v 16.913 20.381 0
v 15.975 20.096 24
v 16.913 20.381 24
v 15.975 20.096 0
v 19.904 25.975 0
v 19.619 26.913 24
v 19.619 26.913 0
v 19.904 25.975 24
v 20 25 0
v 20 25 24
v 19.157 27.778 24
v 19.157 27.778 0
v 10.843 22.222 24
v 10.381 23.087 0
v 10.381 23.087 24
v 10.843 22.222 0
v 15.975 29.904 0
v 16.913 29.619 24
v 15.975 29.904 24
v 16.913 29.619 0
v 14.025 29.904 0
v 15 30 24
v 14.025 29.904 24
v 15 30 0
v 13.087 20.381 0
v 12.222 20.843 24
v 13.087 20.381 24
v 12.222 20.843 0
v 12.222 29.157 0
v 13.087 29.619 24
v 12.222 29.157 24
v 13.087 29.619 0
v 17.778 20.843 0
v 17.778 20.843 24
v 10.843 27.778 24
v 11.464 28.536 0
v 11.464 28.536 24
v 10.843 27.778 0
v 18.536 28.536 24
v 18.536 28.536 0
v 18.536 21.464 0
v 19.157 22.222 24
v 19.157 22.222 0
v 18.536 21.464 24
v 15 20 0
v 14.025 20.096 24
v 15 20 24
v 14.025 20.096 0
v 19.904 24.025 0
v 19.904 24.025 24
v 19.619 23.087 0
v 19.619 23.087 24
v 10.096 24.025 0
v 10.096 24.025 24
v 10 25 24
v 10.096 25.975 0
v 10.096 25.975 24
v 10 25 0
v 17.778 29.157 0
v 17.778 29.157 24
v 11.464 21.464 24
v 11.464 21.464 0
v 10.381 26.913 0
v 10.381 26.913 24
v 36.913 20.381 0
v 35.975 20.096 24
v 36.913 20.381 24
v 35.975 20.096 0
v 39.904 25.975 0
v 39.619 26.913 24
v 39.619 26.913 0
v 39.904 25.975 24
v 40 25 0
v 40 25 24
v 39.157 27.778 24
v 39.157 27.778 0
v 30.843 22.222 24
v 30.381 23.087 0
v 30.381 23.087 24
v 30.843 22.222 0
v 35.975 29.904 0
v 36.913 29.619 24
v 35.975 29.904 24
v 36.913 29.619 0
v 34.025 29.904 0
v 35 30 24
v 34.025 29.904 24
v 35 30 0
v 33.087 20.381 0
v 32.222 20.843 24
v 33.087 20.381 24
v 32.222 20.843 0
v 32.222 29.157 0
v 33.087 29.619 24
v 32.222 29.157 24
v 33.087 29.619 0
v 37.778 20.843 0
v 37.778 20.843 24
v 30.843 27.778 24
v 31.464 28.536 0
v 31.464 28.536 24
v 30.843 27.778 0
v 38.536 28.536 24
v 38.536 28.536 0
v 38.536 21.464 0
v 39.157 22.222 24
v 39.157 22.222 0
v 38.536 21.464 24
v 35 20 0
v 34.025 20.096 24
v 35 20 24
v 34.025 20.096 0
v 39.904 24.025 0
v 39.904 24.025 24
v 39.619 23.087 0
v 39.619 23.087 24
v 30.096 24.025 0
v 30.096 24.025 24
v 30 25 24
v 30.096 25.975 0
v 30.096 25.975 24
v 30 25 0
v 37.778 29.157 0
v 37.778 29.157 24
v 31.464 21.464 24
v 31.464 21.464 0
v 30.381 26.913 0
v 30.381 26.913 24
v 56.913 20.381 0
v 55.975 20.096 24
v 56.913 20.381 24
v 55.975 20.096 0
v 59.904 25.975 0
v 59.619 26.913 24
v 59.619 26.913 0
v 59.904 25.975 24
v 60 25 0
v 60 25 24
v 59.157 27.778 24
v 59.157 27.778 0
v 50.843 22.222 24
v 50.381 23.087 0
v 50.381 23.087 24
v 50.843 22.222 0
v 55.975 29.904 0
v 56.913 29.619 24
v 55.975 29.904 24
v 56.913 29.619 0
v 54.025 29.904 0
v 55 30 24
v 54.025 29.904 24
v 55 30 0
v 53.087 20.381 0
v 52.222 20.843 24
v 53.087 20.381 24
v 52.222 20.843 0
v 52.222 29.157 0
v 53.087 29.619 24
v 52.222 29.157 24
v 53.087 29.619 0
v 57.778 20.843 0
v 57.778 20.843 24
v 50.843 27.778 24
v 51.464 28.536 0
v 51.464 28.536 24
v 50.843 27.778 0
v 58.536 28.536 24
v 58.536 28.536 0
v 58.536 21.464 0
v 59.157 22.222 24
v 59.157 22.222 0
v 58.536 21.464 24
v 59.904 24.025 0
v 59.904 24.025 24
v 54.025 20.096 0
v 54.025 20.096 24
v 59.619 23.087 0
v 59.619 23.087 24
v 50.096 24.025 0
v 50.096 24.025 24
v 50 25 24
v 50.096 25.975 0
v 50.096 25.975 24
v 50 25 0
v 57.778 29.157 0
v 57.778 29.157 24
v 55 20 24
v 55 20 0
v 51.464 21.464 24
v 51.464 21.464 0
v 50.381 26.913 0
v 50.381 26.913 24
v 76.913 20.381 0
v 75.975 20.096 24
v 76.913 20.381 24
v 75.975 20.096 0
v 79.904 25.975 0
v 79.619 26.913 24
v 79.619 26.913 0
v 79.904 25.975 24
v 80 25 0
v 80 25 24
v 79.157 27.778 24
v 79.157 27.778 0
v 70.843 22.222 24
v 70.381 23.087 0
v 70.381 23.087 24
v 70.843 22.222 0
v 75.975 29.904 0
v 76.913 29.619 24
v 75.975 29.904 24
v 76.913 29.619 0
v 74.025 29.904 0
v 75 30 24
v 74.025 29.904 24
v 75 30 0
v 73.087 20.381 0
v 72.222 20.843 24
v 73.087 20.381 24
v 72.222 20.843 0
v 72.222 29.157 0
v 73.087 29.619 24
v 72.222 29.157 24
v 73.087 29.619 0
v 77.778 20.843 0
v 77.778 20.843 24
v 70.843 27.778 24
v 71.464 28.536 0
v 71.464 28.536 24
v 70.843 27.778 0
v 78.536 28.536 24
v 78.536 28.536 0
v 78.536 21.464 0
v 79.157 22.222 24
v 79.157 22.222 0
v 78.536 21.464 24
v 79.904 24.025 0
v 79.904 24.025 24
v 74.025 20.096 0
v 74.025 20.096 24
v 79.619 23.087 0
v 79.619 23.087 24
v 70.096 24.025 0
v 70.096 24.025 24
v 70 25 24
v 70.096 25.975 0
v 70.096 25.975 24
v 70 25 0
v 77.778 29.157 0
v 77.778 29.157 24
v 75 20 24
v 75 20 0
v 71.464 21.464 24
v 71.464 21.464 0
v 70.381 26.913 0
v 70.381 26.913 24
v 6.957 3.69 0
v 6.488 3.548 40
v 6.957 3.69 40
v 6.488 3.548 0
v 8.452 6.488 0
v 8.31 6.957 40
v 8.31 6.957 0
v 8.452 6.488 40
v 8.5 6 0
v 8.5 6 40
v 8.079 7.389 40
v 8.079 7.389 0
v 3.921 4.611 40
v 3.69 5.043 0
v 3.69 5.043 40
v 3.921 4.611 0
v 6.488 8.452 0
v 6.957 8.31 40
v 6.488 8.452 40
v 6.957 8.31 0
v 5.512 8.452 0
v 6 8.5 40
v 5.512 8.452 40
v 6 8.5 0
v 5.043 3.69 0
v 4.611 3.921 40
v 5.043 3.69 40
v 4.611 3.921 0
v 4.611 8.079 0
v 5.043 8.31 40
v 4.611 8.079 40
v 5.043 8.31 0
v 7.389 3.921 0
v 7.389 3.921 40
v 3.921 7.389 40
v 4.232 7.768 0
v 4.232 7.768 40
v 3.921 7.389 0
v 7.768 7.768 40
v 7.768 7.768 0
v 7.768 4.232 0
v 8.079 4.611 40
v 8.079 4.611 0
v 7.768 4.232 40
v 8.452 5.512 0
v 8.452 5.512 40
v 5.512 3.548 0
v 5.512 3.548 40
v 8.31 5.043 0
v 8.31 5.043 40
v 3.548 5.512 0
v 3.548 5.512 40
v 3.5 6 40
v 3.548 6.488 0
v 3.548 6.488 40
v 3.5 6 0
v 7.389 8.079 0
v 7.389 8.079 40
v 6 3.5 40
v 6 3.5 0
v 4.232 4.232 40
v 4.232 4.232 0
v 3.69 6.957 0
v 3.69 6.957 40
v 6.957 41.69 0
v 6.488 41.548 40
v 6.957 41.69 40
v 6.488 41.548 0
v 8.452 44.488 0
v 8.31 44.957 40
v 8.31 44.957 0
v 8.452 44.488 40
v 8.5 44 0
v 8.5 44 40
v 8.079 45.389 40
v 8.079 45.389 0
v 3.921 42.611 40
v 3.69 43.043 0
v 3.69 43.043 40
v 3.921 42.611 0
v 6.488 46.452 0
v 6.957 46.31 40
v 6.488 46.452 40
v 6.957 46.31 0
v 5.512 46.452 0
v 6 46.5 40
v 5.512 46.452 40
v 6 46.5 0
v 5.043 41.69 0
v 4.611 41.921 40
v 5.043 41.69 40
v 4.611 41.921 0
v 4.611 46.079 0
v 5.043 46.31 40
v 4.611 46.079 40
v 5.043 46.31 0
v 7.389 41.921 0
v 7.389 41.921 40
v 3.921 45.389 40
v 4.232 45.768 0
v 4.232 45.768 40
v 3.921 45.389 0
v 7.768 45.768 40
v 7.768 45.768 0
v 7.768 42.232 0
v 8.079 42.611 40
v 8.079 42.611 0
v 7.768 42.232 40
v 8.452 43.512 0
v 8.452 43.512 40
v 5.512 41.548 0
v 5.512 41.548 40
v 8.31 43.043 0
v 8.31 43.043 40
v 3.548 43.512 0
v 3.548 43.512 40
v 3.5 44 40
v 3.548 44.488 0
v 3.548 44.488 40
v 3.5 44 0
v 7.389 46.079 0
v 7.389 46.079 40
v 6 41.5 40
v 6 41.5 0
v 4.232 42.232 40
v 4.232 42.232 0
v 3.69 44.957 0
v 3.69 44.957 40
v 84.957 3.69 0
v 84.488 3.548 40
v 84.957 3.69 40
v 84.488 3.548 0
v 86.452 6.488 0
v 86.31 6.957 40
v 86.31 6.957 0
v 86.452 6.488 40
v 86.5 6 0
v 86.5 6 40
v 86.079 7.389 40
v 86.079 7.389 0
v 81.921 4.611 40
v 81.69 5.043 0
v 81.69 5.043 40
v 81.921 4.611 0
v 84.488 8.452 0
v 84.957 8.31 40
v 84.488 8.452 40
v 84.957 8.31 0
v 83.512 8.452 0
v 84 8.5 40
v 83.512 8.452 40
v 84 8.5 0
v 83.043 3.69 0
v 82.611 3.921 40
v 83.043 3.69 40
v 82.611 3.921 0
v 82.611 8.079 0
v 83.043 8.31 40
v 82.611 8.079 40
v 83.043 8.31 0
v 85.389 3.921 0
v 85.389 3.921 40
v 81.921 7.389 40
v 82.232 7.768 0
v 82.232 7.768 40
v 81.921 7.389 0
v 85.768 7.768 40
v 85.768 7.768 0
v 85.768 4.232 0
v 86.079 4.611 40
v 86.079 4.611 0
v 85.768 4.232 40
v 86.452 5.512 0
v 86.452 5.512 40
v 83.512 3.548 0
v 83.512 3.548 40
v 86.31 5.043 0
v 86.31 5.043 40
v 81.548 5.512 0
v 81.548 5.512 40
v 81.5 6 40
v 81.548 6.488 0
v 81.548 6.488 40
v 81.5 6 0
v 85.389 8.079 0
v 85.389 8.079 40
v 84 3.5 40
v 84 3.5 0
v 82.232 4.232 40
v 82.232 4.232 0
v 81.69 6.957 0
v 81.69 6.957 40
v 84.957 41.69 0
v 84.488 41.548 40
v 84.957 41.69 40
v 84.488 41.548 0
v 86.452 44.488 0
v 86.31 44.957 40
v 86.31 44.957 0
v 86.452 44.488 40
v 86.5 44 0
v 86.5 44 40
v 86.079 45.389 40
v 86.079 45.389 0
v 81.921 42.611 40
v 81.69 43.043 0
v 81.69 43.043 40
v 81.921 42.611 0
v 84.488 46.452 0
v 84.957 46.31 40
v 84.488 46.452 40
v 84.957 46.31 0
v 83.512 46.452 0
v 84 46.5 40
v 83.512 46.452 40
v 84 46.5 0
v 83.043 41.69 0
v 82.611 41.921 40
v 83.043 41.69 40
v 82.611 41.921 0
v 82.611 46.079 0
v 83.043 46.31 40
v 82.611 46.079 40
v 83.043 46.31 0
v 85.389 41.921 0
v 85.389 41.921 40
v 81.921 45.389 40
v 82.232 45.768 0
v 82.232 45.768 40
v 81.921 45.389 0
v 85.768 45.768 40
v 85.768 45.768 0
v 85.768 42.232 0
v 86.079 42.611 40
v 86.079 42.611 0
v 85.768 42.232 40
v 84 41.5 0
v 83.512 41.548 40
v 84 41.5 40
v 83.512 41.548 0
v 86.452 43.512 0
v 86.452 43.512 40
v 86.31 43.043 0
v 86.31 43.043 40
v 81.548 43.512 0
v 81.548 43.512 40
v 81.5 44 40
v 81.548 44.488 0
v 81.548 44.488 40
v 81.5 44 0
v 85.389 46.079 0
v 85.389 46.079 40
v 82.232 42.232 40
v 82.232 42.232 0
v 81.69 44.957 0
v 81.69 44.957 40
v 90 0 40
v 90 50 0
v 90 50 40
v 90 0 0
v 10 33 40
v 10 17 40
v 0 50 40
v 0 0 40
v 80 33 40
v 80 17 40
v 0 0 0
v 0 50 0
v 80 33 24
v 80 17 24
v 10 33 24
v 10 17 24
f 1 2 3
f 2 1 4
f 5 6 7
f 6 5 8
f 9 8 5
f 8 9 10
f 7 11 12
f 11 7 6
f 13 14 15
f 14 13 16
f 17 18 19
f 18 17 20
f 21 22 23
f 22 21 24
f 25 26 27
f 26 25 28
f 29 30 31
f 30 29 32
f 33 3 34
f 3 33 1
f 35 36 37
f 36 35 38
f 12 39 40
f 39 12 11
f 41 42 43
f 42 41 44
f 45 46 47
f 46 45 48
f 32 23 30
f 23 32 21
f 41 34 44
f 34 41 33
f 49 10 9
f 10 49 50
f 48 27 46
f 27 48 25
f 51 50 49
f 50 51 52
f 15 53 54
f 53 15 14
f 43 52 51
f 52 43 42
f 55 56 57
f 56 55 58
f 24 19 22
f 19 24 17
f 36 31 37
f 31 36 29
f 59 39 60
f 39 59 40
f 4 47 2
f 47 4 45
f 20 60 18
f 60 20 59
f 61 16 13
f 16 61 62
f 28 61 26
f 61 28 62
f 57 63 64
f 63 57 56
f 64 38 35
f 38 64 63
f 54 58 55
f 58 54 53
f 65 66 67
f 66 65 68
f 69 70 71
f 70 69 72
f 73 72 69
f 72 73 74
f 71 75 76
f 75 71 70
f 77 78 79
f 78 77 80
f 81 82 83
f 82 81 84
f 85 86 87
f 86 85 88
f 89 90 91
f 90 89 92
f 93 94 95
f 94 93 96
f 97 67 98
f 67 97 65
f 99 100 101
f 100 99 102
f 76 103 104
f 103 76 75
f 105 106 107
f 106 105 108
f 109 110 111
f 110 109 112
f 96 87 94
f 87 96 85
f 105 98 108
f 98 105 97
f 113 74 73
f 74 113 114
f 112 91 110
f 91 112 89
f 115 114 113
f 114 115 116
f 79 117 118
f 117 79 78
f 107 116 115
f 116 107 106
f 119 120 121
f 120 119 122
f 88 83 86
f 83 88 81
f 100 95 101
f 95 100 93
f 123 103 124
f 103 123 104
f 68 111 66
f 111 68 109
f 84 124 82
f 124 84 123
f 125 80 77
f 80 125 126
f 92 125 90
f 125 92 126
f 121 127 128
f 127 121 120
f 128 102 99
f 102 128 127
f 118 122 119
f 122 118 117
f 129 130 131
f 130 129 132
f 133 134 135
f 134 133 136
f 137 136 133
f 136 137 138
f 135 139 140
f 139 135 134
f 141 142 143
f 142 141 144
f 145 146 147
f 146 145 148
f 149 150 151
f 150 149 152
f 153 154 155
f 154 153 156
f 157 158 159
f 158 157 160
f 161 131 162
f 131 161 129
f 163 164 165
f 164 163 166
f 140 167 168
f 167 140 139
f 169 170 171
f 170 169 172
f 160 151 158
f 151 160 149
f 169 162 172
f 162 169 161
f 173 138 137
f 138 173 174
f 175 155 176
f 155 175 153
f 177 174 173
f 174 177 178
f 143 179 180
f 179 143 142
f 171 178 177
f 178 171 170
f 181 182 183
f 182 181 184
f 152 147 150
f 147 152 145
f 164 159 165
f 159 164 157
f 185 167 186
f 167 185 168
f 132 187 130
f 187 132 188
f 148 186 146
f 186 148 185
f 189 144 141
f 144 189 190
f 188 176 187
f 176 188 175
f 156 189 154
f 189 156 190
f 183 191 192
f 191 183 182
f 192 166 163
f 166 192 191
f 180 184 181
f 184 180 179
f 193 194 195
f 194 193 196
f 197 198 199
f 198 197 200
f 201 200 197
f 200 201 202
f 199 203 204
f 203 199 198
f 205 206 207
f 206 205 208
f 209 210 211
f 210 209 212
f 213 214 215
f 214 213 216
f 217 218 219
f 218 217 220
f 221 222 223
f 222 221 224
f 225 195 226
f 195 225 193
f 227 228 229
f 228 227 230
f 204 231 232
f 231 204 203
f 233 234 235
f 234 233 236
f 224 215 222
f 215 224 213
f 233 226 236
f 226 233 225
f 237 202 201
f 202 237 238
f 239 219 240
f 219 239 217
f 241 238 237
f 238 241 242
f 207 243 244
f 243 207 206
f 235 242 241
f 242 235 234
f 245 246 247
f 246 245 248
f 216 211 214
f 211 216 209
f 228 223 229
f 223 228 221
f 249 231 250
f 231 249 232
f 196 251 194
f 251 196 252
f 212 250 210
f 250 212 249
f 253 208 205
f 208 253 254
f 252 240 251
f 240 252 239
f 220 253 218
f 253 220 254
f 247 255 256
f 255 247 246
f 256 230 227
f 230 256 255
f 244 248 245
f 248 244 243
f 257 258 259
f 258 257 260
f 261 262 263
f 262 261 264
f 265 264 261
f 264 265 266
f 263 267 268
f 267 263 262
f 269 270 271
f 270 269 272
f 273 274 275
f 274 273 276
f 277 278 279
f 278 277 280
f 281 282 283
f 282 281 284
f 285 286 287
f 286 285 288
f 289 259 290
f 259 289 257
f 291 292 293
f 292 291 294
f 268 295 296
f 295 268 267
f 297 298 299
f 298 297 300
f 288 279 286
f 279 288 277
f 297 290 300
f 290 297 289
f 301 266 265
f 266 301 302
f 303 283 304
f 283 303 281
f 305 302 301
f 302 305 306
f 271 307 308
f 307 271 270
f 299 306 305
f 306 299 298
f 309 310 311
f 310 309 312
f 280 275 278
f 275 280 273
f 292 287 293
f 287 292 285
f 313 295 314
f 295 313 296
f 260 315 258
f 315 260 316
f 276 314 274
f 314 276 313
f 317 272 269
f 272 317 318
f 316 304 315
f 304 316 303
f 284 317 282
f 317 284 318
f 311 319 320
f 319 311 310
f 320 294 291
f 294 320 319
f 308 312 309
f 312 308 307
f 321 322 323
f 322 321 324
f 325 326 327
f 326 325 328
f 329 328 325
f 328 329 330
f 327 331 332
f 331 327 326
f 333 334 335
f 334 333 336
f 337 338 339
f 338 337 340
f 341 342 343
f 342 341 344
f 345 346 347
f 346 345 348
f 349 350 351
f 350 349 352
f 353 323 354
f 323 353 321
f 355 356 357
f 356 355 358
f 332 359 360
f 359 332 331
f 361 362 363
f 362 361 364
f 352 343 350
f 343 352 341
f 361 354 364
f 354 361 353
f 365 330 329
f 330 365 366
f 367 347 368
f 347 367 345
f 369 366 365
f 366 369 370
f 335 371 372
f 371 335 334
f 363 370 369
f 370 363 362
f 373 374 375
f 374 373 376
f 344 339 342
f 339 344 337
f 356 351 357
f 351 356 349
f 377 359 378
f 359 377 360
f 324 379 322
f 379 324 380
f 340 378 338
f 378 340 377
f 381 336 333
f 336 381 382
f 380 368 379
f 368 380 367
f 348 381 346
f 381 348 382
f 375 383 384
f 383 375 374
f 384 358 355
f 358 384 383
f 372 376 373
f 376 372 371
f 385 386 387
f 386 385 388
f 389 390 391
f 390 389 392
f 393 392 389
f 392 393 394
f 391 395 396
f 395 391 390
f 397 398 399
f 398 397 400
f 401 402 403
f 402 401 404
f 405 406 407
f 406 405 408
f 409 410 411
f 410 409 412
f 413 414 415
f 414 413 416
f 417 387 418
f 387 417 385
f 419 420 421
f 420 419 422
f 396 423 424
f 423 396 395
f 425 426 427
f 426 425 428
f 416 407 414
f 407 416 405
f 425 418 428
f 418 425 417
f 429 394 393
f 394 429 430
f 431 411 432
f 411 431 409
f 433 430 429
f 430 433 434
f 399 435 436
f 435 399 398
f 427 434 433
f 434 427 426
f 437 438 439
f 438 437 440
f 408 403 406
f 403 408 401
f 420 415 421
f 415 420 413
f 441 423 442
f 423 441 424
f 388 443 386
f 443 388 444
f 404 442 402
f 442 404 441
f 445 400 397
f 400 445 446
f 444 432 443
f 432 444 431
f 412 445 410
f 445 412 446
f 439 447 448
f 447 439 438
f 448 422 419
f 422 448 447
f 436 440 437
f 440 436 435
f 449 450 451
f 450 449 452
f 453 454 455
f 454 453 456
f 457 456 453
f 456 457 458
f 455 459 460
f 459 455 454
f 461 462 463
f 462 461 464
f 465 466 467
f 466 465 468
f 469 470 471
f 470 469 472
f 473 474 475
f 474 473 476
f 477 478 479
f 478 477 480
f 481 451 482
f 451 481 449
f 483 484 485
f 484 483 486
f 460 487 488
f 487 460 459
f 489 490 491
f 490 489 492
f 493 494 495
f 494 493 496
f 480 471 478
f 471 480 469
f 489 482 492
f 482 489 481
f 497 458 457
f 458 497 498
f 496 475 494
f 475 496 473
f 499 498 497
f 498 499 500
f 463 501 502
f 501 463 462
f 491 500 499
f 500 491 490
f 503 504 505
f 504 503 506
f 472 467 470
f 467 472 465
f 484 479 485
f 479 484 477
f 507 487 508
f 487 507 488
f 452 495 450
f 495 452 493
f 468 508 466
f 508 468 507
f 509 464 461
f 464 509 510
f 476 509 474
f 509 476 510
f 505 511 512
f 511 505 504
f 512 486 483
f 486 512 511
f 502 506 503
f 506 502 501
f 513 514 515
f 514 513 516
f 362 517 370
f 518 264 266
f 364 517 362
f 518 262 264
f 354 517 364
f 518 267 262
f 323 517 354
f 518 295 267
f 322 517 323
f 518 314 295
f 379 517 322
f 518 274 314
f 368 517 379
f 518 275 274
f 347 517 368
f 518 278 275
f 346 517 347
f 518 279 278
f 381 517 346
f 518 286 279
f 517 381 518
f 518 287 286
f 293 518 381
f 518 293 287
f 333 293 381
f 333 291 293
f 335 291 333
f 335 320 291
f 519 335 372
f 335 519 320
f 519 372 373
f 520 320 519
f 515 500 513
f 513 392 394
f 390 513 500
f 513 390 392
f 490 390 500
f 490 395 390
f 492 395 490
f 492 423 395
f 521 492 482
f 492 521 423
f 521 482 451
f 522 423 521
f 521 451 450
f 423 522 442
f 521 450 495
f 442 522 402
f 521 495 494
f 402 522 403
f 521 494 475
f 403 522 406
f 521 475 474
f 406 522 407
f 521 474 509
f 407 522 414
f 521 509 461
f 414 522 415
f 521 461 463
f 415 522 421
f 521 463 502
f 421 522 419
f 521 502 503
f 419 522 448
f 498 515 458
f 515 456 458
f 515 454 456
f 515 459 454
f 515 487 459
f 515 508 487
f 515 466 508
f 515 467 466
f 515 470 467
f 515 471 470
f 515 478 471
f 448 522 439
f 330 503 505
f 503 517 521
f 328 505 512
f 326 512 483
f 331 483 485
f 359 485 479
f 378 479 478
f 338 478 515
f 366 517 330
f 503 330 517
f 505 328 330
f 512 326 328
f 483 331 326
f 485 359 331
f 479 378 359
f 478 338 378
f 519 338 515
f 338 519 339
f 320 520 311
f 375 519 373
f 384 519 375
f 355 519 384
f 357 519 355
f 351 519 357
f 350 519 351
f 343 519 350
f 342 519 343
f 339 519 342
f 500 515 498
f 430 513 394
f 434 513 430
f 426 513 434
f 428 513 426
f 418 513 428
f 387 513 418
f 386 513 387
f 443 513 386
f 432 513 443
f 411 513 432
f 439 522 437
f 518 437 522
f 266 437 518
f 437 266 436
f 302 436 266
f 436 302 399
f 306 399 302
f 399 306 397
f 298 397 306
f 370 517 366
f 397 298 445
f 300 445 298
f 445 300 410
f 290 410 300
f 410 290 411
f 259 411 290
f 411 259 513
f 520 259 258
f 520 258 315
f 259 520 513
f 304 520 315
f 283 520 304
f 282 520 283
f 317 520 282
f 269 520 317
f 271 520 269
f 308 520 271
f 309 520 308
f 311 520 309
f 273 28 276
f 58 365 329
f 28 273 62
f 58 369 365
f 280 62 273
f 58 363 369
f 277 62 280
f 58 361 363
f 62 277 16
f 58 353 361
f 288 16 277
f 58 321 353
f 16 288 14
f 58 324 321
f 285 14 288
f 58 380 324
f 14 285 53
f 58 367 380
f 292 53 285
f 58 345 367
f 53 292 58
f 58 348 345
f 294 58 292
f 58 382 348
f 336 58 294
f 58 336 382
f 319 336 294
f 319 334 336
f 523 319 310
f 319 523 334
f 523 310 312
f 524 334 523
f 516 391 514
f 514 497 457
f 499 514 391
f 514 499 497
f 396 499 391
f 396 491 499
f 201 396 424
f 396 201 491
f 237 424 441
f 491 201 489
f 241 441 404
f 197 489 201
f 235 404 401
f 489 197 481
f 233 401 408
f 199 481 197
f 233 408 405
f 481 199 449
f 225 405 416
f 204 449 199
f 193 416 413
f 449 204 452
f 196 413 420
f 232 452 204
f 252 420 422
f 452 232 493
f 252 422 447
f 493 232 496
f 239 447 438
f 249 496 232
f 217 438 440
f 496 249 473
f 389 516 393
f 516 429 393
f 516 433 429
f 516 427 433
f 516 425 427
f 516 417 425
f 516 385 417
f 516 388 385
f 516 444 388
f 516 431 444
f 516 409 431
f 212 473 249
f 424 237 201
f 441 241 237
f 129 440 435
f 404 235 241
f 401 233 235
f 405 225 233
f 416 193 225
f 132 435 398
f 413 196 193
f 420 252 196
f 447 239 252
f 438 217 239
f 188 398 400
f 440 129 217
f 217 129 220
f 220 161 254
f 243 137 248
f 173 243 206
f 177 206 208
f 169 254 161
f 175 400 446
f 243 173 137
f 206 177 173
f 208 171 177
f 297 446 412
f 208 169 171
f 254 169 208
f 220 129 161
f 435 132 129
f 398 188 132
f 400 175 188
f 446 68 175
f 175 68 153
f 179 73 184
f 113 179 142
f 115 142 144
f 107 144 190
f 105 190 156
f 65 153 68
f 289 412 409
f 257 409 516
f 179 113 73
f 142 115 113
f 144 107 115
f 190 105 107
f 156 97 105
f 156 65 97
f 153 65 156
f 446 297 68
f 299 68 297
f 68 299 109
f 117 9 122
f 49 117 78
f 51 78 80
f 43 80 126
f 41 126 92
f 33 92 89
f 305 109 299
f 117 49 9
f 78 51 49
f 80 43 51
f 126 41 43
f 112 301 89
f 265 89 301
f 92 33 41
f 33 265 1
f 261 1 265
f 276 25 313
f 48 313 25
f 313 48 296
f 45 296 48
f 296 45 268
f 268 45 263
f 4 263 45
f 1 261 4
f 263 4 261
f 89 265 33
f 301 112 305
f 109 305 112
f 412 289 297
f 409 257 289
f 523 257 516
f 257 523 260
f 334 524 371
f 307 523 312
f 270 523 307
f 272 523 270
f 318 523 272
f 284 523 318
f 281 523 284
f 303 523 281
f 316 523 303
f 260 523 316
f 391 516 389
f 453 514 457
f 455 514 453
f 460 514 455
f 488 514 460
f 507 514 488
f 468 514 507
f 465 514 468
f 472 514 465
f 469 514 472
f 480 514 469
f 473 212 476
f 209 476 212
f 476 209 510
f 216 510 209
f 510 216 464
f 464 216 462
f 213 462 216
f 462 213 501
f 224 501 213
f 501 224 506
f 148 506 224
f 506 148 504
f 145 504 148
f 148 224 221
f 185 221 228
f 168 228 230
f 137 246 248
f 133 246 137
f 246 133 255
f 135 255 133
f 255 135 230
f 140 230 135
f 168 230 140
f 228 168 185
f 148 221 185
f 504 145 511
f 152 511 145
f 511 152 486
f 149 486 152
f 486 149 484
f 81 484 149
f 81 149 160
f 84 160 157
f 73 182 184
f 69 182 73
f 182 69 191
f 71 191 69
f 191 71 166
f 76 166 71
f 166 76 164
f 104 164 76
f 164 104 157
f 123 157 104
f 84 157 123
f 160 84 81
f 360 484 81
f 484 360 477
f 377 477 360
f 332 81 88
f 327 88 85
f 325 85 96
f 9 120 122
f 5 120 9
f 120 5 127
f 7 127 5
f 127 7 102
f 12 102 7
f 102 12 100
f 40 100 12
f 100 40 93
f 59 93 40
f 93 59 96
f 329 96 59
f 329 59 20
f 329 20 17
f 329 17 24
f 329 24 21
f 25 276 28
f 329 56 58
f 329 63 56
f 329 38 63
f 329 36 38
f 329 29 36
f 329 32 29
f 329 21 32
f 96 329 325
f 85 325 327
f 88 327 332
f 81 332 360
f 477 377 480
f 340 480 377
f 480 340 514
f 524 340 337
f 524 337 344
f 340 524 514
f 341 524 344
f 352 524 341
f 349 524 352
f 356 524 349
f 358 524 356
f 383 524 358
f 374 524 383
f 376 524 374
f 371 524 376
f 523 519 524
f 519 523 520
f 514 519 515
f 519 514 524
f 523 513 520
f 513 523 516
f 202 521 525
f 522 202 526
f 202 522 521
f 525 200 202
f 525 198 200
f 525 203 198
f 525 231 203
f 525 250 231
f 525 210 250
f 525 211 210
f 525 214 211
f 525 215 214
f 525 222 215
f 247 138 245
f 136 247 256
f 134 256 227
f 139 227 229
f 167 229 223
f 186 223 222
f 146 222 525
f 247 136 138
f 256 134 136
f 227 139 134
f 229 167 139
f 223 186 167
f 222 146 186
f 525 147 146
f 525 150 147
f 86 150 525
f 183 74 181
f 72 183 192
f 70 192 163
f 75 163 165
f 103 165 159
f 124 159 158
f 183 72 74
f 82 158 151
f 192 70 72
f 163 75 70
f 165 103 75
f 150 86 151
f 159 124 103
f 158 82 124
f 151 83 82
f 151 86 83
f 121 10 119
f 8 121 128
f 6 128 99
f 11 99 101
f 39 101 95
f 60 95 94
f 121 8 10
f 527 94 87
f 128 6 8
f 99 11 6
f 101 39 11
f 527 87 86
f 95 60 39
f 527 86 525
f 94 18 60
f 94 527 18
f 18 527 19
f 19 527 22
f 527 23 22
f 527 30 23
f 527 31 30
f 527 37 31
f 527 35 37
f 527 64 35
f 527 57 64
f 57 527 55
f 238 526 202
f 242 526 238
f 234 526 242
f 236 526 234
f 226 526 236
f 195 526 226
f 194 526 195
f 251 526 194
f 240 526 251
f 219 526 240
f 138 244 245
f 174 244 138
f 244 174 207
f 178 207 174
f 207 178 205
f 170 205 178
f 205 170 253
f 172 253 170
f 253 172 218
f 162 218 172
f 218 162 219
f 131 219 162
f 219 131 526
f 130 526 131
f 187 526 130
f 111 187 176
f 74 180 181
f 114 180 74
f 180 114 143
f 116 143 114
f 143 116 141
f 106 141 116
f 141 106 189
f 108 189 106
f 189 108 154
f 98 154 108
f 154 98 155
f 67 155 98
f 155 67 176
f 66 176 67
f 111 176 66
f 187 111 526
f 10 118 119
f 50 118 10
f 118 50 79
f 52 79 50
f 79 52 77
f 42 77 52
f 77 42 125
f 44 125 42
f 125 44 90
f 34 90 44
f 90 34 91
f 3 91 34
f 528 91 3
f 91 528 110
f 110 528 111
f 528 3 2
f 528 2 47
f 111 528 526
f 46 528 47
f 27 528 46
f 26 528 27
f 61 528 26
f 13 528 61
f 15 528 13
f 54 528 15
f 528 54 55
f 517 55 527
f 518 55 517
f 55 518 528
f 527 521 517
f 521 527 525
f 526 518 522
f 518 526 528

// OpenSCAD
$fn = 32;

// ----------------------------------------------------------------------
// Manifold block: gallery_top manifold
// ----------------------------------------------------------------------

// --- parameters (mm) ---
block_l = 90;             // block length, X
block_w = 50;             // block width, Y
block_h = 40;             // block height, Z
port_d = 10;              // port bore diameter
port_pitch = 20;          // port pitch along X
gallery_d = 16;           // top gallery width, Y
gallery_depth = 16;       // gallery pocket depth
wall_p = 10;              // gallery end wall thickness, X
mnt_d = 5;                // mounting hole diameter
mnt_in = 6;               // mounting hole inset from the edges
fit_tol = 0.05;           // tolerance for press fits, mm
free_tol = 0.3;           // tolerance for clearance fits, mm

n_ports = 4;  // ports in the row
port_x0 = (block_l - (n_ports - 1) * port_pitch) / 2;  // first port X

difference() {
  cube([block_l, block_w, block_h]);
  for (i = [0 : n_ports - 1])
    translate([port_x0 + i * port_pitch, block_w / 2, -1])
      cylinder(h = block_h + 2, d = port_d);
  translate([wall_p, block_w / 2 - gallery_d / 2, block_h - gallery_depth])
    cube([block_l - 2 * wall_p, gallery_d, gallery_depth + 1]);
  for (cx = [mnt_in, block_l - mnt_in])
    for (cy = [mnt_in, block_w - mnt_in])
      translate([cx, cy, -1]) cylinder(h = block_h + 2, d = mnt_d);
}
